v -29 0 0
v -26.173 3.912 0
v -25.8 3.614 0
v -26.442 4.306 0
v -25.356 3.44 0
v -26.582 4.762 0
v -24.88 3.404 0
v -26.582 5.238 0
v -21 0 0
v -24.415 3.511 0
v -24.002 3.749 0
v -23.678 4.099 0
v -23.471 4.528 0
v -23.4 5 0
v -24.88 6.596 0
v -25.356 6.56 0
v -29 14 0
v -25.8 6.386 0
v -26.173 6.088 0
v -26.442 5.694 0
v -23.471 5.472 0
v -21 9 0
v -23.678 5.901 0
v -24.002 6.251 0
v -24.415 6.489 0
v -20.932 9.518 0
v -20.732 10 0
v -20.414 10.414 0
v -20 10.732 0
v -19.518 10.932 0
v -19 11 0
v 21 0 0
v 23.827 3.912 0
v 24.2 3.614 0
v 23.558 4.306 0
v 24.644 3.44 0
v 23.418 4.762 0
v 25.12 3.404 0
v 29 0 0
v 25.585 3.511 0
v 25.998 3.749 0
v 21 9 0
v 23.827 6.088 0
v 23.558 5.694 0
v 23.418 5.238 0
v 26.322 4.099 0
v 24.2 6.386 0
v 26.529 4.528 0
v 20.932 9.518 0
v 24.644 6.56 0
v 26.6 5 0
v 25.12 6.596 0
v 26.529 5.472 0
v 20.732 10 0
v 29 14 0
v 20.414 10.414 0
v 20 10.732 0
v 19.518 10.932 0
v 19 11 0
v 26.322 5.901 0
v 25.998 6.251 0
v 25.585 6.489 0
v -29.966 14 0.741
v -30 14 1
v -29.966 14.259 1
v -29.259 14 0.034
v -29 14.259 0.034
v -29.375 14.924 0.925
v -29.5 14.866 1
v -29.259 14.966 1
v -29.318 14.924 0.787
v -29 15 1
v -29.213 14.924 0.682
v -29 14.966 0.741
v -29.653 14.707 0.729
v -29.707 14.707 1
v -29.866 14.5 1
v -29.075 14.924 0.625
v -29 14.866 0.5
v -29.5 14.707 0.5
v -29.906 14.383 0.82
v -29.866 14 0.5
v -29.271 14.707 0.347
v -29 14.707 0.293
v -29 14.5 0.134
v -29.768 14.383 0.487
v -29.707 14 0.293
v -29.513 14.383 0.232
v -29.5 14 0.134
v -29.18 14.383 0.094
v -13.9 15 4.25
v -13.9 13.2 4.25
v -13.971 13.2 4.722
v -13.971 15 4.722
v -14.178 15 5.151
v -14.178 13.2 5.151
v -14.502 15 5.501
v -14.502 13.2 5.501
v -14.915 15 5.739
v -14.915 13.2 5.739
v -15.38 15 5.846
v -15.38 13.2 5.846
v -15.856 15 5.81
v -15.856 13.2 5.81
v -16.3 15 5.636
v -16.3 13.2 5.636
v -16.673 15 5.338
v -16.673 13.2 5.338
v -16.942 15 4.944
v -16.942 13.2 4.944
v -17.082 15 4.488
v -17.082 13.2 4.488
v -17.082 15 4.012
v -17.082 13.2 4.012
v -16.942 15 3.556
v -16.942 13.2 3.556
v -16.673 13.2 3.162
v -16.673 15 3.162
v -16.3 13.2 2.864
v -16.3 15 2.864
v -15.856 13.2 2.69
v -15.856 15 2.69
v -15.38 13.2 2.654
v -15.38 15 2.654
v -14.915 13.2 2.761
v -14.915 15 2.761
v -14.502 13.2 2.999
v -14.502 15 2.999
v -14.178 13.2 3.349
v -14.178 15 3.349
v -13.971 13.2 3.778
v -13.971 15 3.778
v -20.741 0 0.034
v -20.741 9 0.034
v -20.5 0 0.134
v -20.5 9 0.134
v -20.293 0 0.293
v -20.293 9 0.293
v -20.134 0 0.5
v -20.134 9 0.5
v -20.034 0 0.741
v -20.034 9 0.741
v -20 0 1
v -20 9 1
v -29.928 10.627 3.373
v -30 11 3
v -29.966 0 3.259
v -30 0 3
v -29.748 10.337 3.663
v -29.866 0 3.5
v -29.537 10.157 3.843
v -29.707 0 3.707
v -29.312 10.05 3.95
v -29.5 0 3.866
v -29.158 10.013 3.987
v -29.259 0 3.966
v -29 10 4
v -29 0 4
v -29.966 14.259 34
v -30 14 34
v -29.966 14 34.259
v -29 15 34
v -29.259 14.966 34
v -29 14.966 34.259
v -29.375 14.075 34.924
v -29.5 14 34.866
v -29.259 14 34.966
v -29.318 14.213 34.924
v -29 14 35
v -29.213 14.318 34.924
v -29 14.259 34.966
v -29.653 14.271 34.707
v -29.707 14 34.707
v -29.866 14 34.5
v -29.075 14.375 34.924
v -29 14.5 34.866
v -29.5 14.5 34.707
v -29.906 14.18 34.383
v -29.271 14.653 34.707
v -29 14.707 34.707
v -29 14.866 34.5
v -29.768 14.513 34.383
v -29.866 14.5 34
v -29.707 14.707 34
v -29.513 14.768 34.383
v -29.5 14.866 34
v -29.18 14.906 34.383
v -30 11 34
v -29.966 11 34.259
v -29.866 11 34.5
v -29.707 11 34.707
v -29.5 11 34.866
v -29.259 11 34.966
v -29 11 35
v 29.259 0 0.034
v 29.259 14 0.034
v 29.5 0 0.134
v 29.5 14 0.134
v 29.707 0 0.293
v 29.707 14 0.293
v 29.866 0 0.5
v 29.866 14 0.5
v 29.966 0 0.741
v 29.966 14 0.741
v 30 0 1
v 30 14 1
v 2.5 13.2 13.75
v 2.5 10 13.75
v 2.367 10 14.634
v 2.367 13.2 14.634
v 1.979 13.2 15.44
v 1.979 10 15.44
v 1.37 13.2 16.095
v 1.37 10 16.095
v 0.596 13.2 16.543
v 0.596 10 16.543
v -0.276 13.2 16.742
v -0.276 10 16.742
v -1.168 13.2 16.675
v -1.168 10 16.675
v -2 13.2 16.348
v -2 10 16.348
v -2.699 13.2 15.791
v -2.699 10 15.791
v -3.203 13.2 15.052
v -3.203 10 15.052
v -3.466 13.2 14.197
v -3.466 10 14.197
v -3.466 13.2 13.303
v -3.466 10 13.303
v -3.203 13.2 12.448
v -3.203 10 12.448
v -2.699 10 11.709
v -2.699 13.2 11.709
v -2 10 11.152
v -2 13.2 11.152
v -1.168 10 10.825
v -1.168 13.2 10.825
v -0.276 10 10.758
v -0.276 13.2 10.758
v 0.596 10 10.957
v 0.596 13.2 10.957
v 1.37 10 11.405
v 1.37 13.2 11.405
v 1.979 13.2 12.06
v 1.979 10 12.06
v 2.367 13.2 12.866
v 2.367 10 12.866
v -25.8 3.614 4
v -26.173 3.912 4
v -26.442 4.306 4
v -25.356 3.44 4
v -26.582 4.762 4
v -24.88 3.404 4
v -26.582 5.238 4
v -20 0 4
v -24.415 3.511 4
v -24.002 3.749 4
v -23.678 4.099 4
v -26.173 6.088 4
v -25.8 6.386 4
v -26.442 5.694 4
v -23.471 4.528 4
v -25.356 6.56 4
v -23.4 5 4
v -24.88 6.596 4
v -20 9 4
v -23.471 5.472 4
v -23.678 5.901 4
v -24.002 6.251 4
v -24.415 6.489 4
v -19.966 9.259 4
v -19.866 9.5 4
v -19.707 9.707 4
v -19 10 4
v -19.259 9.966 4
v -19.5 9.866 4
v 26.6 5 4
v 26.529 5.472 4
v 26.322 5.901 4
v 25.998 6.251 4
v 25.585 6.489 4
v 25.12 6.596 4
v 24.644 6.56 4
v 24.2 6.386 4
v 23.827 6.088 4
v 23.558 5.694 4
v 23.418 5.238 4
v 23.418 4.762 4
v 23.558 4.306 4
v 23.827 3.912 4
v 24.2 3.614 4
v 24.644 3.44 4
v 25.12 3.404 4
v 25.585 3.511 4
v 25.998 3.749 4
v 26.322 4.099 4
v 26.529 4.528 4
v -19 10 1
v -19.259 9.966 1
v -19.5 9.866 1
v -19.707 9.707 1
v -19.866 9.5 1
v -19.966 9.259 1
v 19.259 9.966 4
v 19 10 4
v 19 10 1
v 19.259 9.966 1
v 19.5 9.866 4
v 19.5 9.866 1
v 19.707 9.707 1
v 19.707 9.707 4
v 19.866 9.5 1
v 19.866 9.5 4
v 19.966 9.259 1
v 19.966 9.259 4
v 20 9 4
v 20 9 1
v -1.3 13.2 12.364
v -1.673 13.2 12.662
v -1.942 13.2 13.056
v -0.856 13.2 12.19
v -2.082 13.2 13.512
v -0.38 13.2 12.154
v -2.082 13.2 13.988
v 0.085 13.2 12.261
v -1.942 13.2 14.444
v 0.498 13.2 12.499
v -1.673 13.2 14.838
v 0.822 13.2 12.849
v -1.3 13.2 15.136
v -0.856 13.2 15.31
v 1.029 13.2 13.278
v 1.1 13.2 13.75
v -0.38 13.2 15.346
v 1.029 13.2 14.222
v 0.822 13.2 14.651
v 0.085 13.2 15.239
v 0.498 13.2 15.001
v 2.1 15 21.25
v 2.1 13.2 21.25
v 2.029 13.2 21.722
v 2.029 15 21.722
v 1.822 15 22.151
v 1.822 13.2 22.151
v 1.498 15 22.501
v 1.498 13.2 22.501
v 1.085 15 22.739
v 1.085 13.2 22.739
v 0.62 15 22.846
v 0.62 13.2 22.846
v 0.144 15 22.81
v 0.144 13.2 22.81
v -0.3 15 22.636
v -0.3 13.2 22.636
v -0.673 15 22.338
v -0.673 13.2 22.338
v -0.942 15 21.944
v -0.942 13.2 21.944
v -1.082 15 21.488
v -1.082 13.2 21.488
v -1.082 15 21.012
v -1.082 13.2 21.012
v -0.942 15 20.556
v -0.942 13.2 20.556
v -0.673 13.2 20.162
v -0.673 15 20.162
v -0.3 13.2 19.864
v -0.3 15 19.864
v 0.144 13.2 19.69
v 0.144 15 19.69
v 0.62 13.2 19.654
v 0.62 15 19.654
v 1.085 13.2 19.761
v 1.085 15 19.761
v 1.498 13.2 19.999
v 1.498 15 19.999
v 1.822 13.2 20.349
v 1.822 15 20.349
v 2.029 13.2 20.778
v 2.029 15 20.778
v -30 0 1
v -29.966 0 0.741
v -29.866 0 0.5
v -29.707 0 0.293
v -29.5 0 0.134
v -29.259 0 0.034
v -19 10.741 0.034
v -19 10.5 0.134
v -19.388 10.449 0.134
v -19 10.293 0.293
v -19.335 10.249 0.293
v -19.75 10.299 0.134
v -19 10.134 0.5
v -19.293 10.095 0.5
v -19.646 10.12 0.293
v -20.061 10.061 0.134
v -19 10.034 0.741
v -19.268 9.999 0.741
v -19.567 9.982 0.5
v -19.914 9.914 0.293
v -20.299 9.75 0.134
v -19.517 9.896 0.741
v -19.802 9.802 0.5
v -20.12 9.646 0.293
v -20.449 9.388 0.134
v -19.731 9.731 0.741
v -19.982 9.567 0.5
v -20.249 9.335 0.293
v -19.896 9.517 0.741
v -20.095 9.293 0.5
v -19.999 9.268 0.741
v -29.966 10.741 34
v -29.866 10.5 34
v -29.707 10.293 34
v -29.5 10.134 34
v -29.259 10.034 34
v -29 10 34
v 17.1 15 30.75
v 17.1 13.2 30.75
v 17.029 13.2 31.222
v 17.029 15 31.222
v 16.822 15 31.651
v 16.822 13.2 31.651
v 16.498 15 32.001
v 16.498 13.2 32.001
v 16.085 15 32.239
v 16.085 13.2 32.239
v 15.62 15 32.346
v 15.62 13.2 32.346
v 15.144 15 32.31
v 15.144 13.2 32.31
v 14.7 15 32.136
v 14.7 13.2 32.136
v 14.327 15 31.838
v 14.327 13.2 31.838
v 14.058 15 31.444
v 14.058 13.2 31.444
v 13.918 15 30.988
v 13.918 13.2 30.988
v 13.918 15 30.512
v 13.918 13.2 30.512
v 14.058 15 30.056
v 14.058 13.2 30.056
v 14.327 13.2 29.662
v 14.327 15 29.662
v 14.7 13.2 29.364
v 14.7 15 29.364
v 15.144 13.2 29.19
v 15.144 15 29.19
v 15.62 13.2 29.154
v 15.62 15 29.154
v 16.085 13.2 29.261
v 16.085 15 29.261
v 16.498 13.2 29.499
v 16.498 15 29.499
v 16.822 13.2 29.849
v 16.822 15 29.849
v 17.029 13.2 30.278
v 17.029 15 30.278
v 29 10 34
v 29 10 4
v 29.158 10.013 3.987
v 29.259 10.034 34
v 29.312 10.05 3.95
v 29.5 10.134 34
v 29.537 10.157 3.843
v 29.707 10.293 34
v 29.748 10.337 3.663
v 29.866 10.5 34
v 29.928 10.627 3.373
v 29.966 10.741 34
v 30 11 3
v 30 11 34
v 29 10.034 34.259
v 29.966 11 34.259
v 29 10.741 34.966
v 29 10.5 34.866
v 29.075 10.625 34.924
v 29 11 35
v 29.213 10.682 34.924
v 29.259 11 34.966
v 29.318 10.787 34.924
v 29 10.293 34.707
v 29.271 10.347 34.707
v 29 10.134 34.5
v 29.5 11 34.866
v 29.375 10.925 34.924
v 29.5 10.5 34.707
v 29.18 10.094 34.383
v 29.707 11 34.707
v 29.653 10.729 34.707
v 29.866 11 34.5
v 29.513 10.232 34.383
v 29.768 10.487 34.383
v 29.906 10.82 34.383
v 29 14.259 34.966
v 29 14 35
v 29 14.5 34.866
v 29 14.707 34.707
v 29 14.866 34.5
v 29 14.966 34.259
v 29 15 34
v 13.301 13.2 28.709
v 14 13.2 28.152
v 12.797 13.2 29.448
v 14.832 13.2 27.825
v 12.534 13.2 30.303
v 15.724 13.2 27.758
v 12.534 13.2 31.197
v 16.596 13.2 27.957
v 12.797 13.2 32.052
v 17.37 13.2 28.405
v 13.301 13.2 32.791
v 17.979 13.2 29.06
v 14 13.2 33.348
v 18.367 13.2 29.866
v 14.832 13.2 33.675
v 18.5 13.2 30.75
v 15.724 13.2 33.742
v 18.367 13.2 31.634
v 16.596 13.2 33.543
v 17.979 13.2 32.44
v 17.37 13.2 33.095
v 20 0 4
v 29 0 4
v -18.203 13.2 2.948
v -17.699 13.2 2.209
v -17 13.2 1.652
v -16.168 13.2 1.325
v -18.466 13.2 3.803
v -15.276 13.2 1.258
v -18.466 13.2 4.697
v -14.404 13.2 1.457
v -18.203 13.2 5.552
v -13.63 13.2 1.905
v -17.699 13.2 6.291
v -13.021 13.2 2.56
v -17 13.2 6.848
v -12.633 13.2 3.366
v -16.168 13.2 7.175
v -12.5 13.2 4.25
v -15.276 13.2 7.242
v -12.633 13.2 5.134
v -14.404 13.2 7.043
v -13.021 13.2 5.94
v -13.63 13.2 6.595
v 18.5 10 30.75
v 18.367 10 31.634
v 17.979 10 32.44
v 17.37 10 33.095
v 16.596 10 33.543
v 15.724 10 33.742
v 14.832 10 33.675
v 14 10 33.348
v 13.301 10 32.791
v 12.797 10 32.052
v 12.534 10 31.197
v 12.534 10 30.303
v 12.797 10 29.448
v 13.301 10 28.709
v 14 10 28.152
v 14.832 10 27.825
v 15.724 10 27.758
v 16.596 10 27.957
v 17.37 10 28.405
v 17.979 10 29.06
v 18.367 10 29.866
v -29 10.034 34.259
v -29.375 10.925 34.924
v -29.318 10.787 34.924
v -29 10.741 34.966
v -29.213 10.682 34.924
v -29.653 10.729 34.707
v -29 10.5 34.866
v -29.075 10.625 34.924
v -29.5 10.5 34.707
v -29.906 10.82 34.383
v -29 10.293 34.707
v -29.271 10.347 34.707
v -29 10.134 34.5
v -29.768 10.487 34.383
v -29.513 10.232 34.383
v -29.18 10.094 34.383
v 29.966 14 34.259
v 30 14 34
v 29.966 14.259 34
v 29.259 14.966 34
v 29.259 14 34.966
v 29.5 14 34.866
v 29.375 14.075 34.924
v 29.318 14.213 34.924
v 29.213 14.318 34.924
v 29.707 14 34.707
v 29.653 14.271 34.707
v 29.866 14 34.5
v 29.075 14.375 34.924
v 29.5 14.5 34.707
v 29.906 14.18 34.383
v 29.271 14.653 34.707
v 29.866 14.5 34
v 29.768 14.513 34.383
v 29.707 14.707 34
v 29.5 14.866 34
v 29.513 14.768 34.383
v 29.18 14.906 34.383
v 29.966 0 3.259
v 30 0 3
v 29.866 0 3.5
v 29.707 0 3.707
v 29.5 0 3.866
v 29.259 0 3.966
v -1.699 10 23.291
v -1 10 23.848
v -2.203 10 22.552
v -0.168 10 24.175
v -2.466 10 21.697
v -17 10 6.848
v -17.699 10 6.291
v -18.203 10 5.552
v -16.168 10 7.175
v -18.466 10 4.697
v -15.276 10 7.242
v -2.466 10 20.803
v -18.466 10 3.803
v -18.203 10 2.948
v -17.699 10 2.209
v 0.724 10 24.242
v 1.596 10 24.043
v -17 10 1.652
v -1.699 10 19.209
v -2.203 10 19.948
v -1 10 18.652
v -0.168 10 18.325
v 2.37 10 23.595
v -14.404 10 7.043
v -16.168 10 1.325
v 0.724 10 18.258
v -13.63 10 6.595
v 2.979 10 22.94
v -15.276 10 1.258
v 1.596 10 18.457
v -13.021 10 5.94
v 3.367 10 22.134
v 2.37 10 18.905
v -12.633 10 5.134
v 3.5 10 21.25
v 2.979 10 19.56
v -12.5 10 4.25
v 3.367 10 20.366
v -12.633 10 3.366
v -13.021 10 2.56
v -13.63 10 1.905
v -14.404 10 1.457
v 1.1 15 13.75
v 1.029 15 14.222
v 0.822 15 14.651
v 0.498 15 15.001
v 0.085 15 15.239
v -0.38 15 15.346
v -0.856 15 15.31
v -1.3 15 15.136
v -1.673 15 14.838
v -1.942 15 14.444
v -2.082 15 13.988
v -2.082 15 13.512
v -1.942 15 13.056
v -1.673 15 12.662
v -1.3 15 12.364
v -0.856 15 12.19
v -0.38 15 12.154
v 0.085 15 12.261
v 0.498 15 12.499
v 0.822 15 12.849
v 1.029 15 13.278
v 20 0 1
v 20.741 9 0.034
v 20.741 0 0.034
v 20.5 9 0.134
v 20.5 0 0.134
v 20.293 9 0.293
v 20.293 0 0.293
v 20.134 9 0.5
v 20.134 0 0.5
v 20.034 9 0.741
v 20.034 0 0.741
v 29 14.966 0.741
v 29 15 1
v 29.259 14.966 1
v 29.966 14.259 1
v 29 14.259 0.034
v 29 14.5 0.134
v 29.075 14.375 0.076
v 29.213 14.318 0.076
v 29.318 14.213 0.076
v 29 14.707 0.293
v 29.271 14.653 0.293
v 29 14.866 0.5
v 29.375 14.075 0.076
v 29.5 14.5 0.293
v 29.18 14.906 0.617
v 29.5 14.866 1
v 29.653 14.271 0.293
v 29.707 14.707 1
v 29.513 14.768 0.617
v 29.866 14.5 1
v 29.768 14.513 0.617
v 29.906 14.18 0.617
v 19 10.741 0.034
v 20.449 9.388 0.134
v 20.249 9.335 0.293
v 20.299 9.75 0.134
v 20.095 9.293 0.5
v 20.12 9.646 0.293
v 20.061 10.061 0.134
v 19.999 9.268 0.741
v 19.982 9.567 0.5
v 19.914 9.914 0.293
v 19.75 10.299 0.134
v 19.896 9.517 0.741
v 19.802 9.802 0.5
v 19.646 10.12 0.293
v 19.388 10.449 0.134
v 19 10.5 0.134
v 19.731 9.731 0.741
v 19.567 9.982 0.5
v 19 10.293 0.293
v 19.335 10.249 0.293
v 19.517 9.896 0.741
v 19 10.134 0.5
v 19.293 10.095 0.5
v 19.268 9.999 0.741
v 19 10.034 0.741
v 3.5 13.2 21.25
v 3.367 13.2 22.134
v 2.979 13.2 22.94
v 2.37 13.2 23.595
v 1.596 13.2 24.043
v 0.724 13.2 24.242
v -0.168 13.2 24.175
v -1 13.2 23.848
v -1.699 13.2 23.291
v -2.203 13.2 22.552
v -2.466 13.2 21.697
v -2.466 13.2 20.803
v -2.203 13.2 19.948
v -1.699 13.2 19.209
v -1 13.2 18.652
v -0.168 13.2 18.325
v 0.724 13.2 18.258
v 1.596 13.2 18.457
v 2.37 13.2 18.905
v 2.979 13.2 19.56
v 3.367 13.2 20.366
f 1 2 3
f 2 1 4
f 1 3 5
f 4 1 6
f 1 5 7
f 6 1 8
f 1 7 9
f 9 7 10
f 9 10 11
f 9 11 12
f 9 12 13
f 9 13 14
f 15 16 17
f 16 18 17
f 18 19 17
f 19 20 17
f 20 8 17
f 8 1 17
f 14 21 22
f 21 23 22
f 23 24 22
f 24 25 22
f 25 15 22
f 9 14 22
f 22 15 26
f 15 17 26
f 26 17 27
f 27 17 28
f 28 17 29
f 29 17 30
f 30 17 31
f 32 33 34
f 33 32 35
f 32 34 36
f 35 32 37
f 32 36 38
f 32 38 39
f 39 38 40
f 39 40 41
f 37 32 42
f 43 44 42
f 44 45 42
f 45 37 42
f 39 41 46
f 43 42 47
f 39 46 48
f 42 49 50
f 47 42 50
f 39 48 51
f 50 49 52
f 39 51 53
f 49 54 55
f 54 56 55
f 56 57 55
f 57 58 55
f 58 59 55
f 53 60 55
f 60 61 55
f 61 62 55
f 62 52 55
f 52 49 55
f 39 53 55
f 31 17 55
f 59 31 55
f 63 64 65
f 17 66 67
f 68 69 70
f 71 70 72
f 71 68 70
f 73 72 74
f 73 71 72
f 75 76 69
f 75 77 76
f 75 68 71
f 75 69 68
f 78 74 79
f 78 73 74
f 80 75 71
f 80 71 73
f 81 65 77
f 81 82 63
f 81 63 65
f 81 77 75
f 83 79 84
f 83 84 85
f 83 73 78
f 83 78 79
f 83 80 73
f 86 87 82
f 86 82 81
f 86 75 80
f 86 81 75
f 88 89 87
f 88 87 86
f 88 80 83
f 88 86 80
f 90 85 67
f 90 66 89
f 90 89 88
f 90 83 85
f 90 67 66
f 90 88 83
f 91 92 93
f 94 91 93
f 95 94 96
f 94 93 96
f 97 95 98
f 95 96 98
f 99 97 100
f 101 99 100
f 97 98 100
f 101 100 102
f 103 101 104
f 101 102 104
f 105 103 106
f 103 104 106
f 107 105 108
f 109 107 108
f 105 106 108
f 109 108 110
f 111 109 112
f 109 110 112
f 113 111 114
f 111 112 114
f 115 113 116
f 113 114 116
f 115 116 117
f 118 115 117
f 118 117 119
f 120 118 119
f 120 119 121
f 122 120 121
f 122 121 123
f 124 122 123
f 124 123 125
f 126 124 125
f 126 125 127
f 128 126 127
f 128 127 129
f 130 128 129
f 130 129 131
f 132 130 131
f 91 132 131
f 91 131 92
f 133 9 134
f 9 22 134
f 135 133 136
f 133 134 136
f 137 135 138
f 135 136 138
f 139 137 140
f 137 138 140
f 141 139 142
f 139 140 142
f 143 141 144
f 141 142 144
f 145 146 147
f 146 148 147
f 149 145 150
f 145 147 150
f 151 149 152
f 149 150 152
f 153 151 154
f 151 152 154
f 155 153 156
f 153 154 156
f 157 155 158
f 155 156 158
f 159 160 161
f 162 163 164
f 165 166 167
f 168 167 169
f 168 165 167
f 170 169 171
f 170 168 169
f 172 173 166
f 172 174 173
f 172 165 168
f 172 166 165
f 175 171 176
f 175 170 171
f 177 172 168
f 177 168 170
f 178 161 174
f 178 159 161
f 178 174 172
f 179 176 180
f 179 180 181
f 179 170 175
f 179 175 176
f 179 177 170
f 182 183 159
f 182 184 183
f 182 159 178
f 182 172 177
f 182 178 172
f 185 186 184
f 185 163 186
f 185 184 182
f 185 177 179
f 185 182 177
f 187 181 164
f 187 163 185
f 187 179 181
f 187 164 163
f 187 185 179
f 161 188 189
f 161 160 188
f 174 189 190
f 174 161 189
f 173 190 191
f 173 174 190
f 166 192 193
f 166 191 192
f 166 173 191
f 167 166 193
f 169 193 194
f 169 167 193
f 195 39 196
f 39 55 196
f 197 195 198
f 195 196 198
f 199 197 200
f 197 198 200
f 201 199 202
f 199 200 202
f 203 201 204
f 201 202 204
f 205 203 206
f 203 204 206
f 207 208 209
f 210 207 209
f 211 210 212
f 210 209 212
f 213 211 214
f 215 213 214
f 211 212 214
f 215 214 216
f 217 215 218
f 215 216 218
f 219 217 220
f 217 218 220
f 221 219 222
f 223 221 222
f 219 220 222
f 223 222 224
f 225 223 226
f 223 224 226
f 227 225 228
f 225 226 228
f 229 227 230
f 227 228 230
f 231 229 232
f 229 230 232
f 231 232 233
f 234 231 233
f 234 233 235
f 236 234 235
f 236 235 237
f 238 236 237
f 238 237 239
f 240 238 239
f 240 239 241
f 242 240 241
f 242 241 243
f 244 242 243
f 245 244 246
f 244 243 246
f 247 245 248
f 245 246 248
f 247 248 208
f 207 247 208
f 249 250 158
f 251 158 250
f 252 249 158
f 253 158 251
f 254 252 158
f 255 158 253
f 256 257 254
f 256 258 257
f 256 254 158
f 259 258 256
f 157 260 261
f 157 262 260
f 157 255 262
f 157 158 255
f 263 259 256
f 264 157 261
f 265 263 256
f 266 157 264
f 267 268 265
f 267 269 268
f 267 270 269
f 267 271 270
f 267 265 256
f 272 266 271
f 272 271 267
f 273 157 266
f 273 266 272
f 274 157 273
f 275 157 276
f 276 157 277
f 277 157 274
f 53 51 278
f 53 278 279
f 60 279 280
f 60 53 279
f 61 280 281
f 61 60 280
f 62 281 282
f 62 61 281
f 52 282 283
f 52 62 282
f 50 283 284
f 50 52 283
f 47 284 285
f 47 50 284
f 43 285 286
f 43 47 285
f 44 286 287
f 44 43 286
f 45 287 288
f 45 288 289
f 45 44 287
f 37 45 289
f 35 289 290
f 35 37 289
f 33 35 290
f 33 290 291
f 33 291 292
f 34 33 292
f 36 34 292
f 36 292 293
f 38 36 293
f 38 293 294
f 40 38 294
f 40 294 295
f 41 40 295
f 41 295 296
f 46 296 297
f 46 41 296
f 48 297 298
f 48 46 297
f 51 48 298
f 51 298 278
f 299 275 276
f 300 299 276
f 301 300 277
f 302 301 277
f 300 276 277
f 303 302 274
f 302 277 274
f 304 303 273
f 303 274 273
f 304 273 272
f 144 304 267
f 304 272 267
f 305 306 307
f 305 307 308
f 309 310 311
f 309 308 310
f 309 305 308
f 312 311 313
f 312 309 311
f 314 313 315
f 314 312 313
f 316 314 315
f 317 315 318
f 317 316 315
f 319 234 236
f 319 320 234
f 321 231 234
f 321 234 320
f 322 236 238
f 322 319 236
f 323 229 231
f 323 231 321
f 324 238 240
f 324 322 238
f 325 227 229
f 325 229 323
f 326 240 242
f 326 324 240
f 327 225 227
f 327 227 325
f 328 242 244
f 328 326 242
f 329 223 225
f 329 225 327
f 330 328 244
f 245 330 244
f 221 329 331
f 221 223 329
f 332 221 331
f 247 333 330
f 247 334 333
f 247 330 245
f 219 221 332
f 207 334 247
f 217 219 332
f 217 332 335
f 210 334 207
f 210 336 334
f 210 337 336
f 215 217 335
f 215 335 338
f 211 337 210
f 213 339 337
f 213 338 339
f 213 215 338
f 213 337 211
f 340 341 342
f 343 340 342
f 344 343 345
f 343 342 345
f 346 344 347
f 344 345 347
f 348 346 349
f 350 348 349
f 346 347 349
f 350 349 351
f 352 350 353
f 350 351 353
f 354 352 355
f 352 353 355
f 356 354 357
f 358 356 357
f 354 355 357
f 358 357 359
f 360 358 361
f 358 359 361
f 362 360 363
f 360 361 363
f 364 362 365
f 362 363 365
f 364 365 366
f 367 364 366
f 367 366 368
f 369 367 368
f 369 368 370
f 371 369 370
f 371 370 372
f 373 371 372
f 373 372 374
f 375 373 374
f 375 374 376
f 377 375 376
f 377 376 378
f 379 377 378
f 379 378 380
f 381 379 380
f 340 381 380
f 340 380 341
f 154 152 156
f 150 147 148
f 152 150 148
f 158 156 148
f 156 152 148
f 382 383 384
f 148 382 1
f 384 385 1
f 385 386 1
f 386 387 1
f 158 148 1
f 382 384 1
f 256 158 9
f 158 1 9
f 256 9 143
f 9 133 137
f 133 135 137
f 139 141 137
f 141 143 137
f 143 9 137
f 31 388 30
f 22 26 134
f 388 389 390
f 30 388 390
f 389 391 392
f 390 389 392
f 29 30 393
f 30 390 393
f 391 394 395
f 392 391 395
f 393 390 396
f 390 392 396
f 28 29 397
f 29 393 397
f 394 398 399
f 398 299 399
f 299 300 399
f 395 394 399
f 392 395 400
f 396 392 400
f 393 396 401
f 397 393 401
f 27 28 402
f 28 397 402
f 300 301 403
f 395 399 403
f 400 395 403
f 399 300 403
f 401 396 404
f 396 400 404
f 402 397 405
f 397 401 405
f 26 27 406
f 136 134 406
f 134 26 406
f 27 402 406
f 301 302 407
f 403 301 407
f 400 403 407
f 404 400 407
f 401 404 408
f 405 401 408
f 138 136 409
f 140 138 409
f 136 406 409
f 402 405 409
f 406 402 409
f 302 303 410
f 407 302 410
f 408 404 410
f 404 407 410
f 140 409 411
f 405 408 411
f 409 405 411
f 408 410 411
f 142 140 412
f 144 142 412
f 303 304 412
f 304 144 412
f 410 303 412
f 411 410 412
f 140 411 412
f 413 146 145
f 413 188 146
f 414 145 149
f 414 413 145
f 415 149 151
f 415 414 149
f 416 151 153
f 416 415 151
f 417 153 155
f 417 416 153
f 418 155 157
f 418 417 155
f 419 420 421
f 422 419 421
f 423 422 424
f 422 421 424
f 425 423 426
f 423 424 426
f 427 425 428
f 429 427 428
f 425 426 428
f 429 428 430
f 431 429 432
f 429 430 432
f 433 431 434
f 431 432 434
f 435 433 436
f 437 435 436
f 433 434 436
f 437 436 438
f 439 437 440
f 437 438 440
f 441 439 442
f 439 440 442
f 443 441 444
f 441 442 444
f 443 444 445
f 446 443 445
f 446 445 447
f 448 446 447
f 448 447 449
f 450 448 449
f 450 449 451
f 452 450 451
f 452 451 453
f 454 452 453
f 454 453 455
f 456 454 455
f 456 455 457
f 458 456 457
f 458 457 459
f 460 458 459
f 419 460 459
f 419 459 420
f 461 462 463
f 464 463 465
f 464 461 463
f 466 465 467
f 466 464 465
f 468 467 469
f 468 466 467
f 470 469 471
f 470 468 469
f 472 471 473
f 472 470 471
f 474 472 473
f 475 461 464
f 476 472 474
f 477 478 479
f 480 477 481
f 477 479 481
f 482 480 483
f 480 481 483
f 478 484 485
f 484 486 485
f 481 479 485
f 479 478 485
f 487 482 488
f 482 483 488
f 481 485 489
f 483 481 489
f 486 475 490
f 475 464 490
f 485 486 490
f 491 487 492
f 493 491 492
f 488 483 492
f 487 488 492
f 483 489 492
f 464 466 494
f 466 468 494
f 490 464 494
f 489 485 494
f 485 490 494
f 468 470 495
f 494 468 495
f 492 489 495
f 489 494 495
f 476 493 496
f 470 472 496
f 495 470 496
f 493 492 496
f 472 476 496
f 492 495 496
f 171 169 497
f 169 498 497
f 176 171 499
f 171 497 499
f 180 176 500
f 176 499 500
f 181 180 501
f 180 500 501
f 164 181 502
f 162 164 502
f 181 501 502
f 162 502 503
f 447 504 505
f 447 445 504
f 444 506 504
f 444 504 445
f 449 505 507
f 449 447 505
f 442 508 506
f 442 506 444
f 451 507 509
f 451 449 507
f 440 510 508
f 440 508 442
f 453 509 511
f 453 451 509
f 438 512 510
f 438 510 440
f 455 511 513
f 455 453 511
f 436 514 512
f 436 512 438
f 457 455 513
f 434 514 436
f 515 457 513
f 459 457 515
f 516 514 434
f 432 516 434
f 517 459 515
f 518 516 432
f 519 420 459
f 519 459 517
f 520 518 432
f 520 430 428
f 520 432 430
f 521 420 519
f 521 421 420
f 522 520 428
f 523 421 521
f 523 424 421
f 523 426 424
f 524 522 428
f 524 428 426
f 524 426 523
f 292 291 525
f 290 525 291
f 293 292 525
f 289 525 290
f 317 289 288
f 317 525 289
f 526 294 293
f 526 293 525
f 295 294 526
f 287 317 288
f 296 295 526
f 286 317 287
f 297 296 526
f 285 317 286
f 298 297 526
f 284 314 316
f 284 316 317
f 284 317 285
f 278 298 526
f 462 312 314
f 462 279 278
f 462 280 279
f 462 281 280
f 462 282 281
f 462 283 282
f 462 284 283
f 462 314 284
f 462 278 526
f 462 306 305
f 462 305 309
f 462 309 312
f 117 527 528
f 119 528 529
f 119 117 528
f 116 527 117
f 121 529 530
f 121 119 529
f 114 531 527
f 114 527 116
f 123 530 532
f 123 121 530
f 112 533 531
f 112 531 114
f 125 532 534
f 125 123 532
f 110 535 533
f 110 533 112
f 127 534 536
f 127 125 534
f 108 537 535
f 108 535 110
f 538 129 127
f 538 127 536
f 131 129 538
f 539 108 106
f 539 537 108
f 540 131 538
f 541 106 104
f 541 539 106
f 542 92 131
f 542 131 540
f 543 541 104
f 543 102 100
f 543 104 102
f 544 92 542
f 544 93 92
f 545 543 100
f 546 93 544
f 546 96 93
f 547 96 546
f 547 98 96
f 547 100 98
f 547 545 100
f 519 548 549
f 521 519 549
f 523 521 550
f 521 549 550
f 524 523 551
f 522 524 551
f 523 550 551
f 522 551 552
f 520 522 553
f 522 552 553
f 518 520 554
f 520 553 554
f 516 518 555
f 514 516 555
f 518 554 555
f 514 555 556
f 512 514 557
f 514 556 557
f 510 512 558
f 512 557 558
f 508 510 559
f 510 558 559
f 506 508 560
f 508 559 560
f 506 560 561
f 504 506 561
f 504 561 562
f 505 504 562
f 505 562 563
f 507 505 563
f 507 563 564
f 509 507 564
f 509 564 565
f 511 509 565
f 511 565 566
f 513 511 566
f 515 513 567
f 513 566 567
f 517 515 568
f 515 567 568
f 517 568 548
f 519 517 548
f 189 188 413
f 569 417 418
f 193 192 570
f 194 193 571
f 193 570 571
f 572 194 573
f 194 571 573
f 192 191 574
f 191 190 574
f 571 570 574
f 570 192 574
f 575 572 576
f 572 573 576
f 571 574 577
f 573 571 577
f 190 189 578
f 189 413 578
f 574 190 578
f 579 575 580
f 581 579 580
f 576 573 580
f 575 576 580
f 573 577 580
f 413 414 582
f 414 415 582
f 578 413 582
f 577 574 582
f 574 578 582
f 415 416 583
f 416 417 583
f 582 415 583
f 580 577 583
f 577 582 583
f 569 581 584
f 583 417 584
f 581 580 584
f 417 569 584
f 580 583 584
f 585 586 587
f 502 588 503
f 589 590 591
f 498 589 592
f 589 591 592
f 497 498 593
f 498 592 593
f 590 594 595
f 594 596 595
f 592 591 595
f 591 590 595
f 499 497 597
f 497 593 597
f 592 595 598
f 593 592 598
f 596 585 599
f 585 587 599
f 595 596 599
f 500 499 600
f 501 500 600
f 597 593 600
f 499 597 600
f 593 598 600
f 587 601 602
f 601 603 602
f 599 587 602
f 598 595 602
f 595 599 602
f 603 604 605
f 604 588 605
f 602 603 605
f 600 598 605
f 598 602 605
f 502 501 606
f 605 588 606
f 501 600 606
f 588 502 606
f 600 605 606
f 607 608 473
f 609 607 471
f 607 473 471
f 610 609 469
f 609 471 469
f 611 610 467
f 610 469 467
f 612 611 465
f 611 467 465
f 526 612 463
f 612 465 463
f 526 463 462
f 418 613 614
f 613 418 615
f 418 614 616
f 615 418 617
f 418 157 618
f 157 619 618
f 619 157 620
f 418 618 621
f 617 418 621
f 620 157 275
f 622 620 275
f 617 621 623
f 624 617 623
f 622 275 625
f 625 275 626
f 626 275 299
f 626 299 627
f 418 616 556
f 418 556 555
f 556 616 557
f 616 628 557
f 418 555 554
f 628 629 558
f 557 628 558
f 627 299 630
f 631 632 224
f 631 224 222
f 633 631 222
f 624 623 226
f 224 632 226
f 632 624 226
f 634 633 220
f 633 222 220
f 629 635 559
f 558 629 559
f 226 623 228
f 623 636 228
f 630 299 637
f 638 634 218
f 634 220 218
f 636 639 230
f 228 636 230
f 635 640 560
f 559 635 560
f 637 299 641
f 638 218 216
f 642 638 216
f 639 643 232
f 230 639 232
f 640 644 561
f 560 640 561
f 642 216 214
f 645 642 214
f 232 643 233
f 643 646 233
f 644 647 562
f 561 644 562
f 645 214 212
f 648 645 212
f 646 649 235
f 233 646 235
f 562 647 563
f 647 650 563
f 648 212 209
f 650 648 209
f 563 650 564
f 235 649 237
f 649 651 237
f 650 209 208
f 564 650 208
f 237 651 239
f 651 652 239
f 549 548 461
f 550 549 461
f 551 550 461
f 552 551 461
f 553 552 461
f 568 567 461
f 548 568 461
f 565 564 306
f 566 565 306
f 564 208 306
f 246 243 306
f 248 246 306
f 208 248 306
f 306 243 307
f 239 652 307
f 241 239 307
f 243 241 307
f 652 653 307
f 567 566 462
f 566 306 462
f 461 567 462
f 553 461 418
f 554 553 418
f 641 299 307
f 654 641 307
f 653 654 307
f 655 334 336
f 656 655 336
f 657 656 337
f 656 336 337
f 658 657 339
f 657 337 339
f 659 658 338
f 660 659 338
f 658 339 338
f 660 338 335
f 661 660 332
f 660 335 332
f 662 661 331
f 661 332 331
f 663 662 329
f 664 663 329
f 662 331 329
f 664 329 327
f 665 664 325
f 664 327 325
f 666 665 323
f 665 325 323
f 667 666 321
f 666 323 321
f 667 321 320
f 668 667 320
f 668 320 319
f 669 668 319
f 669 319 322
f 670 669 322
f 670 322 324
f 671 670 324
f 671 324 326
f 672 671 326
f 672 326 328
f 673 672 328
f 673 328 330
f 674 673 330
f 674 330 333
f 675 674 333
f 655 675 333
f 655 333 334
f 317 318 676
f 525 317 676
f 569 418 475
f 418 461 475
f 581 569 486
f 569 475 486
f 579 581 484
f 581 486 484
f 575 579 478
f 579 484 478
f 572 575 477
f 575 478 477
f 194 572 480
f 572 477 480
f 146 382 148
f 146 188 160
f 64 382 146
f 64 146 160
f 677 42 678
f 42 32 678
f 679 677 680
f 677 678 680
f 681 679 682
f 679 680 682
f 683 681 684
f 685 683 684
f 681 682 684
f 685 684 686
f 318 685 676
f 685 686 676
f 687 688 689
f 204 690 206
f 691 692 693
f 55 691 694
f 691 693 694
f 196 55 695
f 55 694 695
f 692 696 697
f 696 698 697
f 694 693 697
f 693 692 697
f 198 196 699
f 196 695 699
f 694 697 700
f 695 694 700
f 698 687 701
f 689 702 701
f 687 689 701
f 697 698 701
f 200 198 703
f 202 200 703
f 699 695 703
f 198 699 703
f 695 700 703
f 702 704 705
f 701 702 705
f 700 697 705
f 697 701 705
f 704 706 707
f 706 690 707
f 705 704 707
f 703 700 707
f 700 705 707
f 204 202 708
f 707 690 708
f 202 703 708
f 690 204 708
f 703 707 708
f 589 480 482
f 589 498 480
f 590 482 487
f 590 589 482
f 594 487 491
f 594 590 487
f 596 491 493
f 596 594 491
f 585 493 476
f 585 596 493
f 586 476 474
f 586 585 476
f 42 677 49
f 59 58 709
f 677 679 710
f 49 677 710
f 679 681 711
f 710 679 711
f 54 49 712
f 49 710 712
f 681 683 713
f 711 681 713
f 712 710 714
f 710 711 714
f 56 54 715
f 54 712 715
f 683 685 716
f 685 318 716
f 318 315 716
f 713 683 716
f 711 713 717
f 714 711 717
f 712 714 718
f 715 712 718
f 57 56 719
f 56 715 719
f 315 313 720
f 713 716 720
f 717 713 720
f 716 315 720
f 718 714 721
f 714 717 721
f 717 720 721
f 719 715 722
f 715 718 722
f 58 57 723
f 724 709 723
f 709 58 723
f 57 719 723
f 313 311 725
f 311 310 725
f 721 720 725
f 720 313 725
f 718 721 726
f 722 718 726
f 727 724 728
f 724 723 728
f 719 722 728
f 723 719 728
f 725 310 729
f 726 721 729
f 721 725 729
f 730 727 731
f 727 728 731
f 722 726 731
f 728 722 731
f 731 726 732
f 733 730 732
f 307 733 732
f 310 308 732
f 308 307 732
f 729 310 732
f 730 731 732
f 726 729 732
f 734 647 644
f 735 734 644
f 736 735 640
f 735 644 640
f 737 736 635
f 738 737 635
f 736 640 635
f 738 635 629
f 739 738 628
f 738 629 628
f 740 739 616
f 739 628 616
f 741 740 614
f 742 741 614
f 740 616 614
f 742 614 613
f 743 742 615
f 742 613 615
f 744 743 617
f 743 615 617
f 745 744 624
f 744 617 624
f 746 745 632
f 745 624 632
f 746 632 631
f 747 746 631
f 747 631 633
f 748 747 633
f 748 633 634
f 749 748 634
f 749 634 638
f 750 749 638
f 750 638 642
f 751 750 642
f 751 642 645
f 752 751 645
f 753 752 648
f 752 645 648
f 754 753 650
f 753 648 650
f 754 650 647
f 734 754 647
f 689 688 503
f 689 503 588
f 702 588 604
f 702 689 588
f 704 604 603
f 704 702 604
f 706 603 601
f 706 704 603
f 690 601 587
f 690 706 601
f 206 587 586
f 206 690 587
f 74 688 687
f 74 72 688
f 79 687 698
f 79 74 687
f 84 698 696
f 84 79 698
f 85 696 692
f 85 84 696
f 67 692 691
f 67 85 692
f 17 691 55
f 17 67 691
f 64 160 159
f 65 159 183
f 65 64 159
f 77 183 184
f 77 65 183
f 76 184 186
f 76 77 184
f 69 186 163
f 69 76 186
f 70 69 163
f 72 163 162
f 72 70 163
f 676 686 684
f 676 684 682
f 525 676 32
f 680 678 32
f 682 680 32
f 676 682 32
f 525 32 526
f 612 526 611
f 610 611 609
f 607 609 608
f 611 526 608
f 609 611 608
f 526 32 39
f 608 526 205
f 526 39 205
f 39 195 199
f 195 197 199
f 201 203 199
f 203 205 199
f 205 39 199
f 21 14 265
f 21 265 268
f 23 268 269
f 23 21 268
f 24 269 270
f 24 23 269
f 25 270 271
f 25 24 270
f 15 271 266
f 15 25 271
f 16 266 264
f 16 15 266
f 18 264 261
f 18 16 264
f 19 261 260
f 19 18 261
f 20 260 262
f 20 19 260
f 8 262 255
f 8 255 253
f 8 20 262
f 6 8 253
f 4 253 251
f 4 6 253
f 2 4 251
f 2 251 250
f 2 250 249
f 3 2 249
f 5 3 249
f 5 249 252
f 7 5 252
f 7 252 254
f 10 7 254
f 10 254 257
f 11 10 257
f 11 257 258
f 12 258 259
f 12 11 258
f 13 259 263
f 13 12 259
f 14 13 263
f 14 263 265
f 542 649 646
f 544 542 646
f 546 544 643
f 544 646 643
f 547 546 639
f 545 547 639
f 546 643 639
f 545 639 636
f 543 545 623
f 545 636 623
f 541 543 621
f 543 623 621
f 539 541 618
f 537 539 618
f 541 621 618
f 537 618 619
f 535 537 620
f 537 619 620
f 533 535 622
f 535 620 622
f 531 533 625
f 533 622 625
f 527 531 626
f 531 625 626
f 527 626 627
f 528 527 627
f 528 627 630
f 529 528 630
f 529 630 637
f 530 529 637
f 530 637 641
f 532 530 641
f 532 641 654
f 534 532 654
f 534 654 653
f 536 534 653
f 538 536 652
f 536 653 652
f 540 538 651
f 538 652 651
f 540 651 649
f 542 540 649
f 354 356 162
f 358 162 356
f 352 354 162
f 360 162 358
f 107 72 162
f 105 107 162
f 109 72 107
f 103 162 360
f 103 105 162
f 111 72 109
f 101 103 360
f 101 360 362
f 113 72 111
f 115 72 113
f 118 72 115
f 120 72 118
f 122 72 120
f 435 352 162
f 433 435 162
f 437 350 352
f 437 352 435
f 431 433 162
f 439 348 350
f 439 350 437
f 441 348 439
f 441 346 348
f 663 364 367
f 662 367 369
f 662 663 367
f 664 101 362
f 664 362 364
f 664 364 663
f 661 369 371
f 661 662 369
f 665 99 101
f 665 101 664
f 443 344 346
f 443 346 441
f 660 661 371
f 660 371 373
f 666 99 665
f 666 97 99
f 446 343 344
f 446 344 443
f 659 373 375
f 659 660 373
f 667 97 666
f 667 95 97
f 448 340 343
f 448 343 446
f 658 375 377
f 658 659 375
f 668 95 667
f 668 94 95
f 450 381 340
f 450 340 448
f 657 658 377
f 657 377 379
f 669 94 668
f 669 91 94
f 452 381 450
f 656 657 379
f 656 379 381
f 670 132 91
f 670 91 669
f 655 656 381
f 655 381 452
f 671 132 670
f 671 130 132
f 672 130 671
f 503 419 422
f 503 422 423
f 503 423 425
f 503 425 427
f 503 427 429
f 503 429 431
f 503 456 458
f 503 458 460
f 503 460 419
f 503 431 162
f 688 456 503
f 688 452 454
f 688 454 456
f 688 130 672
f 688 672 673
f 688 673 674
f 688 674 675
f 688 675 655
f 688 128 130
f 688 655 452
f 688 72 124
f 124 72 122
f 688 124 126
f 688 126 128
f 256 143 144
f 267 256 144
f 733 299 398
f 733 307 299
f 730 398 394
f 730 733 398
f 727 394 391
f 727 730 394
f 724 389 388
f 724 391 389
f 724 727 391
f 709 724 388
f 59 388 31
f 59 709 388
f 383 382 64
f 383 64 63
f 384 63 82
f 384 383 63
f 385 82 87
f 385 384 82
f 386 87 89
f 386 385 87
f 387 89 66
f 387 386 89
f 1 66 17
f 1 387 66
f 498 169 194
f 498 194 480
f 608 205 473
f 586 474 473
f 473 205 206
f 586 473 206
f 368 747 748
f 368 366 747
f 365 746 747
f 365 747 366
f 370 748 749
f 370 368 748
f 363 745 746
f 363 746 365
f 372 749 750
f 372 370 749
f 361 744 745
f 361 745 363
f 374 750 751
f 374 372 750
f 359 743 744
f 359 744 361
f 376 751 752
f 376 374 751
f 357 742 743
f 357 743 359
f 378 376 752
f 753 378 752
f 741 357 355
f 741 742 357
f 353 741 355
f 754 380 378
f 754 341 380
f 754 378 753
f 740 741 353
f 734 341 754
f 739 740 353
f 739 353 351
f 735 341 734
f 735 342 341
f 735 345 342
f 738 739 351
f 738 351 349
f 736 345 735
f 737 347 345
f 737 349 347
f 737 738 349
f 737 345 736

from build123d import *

# Parameters (mm, degrees)
SKETCH_1_R          = 1.6
EXTRUDE_1_DEPTH     = 4
SKETCH_2_W          = 60
SKETCH_2_H          = 5
EXTRUDE_2_DEPTH     = 31
SKETCH_8_R          = 1.6
CUT_EXTRUDE_1_DEPTH = 48.16990566
SKETCH_9_R          = 3
CUT_EXTRUDE_2_DEPTH = 3.2
FILLET_2_R          = 1


with BuildPart() as part:
    # 草图1 → 凸台-拉伸1 (new body)
    with BuildSketch(Plane.XY):
        Polygon((20, 0), (30, 0), (30, 15), (-30, 15), (-30, 0), (-20, 0), (-20, 10), (20, 10), align=None)
        with Locations((-25, 5)):
            Circle(SKETCH_1_R, mode=Mode.SUBTRACT)
        with Locations((25, 5)):
            Circle(SKETCH_1_R, mode=Mode.SUBTRACT)
    extrude(amount=EXTRUDE_1_DEPTH)

    # 草图2 → 凸台-拉伸2 (add)
    with BuildSketch(Plane.XY.offset(4)):
        with Locations((0, 12.5)):
            Rectangle(SKETCH_2_W, SKETCH_2_H)
    extrude(amount=EXTRUDE_2_DEPTH)

    # 草图8 → 切除-拉伸1 (cut, through all)
    with BuildSketch(Plane.XZ.offset(-10)):
        with Locations((-15.5, 4.25)):
            Circle(SKETCH_8_R)
        with Locations((-0.5, 13.75)):
            Circle(SKETCH_8_R)
        with Locations((0.5, 21.25)):
            Circle(SKETCH_8_R)
        with Locations((15.5, 30.75)):
            Circle(SKETCH_8_R)
    extrude(amount=-CUT_EXTRUDE_1_DEPTH, mode=Mode.SUBTRACT)

    # 草图9 → 切除-拉伸2 (cut)
    with BuildSketch(Plane.XZ.offset(-10)):
        with Locations((-15.5, 4.25)):
            Circle(SKETCH_9_R)
        with Locations((-0.5, 13.75)):
            Circle(SKETCH_9_R)
        with Locations((0.5, 21.25)):
            Circle(SKETCH_9_R)
        with Locations((15.5, 30.75)):
            Circle(SKETCH_9_R)
    extrude(amount=-CUT_EXTRUDE_2_DEPTH, mode=Mode.SUBTRACT)

    # 圆角2
    fillet_2_edges = [part.edges().sort_by_distance(p)[0] for p in [
        (0, 10, 0),
        (-20, 5, 0),
        (-30, 7.5, 0),
        (-30, 15, 17.5),
        (30, 15, 17.5),
        (20, 10, 2),
        (-20, 10, 2),
        (30, 5, 4),
        (-30, 5, 4),
        (-30, 10, 19.5),
        (30, 10, 19.5),
        (-30, 12.5, 35),
        (0, 10, 35),
        (30, 12.5, 35),
        (0, 15, 35),
        (0, 15, 0),
        (30, 7.5, 0),
        (20, 5, 0),
    ]]
    fillet(fillet_2_edges, radius=FILLET_2_R)


solid = part.part
